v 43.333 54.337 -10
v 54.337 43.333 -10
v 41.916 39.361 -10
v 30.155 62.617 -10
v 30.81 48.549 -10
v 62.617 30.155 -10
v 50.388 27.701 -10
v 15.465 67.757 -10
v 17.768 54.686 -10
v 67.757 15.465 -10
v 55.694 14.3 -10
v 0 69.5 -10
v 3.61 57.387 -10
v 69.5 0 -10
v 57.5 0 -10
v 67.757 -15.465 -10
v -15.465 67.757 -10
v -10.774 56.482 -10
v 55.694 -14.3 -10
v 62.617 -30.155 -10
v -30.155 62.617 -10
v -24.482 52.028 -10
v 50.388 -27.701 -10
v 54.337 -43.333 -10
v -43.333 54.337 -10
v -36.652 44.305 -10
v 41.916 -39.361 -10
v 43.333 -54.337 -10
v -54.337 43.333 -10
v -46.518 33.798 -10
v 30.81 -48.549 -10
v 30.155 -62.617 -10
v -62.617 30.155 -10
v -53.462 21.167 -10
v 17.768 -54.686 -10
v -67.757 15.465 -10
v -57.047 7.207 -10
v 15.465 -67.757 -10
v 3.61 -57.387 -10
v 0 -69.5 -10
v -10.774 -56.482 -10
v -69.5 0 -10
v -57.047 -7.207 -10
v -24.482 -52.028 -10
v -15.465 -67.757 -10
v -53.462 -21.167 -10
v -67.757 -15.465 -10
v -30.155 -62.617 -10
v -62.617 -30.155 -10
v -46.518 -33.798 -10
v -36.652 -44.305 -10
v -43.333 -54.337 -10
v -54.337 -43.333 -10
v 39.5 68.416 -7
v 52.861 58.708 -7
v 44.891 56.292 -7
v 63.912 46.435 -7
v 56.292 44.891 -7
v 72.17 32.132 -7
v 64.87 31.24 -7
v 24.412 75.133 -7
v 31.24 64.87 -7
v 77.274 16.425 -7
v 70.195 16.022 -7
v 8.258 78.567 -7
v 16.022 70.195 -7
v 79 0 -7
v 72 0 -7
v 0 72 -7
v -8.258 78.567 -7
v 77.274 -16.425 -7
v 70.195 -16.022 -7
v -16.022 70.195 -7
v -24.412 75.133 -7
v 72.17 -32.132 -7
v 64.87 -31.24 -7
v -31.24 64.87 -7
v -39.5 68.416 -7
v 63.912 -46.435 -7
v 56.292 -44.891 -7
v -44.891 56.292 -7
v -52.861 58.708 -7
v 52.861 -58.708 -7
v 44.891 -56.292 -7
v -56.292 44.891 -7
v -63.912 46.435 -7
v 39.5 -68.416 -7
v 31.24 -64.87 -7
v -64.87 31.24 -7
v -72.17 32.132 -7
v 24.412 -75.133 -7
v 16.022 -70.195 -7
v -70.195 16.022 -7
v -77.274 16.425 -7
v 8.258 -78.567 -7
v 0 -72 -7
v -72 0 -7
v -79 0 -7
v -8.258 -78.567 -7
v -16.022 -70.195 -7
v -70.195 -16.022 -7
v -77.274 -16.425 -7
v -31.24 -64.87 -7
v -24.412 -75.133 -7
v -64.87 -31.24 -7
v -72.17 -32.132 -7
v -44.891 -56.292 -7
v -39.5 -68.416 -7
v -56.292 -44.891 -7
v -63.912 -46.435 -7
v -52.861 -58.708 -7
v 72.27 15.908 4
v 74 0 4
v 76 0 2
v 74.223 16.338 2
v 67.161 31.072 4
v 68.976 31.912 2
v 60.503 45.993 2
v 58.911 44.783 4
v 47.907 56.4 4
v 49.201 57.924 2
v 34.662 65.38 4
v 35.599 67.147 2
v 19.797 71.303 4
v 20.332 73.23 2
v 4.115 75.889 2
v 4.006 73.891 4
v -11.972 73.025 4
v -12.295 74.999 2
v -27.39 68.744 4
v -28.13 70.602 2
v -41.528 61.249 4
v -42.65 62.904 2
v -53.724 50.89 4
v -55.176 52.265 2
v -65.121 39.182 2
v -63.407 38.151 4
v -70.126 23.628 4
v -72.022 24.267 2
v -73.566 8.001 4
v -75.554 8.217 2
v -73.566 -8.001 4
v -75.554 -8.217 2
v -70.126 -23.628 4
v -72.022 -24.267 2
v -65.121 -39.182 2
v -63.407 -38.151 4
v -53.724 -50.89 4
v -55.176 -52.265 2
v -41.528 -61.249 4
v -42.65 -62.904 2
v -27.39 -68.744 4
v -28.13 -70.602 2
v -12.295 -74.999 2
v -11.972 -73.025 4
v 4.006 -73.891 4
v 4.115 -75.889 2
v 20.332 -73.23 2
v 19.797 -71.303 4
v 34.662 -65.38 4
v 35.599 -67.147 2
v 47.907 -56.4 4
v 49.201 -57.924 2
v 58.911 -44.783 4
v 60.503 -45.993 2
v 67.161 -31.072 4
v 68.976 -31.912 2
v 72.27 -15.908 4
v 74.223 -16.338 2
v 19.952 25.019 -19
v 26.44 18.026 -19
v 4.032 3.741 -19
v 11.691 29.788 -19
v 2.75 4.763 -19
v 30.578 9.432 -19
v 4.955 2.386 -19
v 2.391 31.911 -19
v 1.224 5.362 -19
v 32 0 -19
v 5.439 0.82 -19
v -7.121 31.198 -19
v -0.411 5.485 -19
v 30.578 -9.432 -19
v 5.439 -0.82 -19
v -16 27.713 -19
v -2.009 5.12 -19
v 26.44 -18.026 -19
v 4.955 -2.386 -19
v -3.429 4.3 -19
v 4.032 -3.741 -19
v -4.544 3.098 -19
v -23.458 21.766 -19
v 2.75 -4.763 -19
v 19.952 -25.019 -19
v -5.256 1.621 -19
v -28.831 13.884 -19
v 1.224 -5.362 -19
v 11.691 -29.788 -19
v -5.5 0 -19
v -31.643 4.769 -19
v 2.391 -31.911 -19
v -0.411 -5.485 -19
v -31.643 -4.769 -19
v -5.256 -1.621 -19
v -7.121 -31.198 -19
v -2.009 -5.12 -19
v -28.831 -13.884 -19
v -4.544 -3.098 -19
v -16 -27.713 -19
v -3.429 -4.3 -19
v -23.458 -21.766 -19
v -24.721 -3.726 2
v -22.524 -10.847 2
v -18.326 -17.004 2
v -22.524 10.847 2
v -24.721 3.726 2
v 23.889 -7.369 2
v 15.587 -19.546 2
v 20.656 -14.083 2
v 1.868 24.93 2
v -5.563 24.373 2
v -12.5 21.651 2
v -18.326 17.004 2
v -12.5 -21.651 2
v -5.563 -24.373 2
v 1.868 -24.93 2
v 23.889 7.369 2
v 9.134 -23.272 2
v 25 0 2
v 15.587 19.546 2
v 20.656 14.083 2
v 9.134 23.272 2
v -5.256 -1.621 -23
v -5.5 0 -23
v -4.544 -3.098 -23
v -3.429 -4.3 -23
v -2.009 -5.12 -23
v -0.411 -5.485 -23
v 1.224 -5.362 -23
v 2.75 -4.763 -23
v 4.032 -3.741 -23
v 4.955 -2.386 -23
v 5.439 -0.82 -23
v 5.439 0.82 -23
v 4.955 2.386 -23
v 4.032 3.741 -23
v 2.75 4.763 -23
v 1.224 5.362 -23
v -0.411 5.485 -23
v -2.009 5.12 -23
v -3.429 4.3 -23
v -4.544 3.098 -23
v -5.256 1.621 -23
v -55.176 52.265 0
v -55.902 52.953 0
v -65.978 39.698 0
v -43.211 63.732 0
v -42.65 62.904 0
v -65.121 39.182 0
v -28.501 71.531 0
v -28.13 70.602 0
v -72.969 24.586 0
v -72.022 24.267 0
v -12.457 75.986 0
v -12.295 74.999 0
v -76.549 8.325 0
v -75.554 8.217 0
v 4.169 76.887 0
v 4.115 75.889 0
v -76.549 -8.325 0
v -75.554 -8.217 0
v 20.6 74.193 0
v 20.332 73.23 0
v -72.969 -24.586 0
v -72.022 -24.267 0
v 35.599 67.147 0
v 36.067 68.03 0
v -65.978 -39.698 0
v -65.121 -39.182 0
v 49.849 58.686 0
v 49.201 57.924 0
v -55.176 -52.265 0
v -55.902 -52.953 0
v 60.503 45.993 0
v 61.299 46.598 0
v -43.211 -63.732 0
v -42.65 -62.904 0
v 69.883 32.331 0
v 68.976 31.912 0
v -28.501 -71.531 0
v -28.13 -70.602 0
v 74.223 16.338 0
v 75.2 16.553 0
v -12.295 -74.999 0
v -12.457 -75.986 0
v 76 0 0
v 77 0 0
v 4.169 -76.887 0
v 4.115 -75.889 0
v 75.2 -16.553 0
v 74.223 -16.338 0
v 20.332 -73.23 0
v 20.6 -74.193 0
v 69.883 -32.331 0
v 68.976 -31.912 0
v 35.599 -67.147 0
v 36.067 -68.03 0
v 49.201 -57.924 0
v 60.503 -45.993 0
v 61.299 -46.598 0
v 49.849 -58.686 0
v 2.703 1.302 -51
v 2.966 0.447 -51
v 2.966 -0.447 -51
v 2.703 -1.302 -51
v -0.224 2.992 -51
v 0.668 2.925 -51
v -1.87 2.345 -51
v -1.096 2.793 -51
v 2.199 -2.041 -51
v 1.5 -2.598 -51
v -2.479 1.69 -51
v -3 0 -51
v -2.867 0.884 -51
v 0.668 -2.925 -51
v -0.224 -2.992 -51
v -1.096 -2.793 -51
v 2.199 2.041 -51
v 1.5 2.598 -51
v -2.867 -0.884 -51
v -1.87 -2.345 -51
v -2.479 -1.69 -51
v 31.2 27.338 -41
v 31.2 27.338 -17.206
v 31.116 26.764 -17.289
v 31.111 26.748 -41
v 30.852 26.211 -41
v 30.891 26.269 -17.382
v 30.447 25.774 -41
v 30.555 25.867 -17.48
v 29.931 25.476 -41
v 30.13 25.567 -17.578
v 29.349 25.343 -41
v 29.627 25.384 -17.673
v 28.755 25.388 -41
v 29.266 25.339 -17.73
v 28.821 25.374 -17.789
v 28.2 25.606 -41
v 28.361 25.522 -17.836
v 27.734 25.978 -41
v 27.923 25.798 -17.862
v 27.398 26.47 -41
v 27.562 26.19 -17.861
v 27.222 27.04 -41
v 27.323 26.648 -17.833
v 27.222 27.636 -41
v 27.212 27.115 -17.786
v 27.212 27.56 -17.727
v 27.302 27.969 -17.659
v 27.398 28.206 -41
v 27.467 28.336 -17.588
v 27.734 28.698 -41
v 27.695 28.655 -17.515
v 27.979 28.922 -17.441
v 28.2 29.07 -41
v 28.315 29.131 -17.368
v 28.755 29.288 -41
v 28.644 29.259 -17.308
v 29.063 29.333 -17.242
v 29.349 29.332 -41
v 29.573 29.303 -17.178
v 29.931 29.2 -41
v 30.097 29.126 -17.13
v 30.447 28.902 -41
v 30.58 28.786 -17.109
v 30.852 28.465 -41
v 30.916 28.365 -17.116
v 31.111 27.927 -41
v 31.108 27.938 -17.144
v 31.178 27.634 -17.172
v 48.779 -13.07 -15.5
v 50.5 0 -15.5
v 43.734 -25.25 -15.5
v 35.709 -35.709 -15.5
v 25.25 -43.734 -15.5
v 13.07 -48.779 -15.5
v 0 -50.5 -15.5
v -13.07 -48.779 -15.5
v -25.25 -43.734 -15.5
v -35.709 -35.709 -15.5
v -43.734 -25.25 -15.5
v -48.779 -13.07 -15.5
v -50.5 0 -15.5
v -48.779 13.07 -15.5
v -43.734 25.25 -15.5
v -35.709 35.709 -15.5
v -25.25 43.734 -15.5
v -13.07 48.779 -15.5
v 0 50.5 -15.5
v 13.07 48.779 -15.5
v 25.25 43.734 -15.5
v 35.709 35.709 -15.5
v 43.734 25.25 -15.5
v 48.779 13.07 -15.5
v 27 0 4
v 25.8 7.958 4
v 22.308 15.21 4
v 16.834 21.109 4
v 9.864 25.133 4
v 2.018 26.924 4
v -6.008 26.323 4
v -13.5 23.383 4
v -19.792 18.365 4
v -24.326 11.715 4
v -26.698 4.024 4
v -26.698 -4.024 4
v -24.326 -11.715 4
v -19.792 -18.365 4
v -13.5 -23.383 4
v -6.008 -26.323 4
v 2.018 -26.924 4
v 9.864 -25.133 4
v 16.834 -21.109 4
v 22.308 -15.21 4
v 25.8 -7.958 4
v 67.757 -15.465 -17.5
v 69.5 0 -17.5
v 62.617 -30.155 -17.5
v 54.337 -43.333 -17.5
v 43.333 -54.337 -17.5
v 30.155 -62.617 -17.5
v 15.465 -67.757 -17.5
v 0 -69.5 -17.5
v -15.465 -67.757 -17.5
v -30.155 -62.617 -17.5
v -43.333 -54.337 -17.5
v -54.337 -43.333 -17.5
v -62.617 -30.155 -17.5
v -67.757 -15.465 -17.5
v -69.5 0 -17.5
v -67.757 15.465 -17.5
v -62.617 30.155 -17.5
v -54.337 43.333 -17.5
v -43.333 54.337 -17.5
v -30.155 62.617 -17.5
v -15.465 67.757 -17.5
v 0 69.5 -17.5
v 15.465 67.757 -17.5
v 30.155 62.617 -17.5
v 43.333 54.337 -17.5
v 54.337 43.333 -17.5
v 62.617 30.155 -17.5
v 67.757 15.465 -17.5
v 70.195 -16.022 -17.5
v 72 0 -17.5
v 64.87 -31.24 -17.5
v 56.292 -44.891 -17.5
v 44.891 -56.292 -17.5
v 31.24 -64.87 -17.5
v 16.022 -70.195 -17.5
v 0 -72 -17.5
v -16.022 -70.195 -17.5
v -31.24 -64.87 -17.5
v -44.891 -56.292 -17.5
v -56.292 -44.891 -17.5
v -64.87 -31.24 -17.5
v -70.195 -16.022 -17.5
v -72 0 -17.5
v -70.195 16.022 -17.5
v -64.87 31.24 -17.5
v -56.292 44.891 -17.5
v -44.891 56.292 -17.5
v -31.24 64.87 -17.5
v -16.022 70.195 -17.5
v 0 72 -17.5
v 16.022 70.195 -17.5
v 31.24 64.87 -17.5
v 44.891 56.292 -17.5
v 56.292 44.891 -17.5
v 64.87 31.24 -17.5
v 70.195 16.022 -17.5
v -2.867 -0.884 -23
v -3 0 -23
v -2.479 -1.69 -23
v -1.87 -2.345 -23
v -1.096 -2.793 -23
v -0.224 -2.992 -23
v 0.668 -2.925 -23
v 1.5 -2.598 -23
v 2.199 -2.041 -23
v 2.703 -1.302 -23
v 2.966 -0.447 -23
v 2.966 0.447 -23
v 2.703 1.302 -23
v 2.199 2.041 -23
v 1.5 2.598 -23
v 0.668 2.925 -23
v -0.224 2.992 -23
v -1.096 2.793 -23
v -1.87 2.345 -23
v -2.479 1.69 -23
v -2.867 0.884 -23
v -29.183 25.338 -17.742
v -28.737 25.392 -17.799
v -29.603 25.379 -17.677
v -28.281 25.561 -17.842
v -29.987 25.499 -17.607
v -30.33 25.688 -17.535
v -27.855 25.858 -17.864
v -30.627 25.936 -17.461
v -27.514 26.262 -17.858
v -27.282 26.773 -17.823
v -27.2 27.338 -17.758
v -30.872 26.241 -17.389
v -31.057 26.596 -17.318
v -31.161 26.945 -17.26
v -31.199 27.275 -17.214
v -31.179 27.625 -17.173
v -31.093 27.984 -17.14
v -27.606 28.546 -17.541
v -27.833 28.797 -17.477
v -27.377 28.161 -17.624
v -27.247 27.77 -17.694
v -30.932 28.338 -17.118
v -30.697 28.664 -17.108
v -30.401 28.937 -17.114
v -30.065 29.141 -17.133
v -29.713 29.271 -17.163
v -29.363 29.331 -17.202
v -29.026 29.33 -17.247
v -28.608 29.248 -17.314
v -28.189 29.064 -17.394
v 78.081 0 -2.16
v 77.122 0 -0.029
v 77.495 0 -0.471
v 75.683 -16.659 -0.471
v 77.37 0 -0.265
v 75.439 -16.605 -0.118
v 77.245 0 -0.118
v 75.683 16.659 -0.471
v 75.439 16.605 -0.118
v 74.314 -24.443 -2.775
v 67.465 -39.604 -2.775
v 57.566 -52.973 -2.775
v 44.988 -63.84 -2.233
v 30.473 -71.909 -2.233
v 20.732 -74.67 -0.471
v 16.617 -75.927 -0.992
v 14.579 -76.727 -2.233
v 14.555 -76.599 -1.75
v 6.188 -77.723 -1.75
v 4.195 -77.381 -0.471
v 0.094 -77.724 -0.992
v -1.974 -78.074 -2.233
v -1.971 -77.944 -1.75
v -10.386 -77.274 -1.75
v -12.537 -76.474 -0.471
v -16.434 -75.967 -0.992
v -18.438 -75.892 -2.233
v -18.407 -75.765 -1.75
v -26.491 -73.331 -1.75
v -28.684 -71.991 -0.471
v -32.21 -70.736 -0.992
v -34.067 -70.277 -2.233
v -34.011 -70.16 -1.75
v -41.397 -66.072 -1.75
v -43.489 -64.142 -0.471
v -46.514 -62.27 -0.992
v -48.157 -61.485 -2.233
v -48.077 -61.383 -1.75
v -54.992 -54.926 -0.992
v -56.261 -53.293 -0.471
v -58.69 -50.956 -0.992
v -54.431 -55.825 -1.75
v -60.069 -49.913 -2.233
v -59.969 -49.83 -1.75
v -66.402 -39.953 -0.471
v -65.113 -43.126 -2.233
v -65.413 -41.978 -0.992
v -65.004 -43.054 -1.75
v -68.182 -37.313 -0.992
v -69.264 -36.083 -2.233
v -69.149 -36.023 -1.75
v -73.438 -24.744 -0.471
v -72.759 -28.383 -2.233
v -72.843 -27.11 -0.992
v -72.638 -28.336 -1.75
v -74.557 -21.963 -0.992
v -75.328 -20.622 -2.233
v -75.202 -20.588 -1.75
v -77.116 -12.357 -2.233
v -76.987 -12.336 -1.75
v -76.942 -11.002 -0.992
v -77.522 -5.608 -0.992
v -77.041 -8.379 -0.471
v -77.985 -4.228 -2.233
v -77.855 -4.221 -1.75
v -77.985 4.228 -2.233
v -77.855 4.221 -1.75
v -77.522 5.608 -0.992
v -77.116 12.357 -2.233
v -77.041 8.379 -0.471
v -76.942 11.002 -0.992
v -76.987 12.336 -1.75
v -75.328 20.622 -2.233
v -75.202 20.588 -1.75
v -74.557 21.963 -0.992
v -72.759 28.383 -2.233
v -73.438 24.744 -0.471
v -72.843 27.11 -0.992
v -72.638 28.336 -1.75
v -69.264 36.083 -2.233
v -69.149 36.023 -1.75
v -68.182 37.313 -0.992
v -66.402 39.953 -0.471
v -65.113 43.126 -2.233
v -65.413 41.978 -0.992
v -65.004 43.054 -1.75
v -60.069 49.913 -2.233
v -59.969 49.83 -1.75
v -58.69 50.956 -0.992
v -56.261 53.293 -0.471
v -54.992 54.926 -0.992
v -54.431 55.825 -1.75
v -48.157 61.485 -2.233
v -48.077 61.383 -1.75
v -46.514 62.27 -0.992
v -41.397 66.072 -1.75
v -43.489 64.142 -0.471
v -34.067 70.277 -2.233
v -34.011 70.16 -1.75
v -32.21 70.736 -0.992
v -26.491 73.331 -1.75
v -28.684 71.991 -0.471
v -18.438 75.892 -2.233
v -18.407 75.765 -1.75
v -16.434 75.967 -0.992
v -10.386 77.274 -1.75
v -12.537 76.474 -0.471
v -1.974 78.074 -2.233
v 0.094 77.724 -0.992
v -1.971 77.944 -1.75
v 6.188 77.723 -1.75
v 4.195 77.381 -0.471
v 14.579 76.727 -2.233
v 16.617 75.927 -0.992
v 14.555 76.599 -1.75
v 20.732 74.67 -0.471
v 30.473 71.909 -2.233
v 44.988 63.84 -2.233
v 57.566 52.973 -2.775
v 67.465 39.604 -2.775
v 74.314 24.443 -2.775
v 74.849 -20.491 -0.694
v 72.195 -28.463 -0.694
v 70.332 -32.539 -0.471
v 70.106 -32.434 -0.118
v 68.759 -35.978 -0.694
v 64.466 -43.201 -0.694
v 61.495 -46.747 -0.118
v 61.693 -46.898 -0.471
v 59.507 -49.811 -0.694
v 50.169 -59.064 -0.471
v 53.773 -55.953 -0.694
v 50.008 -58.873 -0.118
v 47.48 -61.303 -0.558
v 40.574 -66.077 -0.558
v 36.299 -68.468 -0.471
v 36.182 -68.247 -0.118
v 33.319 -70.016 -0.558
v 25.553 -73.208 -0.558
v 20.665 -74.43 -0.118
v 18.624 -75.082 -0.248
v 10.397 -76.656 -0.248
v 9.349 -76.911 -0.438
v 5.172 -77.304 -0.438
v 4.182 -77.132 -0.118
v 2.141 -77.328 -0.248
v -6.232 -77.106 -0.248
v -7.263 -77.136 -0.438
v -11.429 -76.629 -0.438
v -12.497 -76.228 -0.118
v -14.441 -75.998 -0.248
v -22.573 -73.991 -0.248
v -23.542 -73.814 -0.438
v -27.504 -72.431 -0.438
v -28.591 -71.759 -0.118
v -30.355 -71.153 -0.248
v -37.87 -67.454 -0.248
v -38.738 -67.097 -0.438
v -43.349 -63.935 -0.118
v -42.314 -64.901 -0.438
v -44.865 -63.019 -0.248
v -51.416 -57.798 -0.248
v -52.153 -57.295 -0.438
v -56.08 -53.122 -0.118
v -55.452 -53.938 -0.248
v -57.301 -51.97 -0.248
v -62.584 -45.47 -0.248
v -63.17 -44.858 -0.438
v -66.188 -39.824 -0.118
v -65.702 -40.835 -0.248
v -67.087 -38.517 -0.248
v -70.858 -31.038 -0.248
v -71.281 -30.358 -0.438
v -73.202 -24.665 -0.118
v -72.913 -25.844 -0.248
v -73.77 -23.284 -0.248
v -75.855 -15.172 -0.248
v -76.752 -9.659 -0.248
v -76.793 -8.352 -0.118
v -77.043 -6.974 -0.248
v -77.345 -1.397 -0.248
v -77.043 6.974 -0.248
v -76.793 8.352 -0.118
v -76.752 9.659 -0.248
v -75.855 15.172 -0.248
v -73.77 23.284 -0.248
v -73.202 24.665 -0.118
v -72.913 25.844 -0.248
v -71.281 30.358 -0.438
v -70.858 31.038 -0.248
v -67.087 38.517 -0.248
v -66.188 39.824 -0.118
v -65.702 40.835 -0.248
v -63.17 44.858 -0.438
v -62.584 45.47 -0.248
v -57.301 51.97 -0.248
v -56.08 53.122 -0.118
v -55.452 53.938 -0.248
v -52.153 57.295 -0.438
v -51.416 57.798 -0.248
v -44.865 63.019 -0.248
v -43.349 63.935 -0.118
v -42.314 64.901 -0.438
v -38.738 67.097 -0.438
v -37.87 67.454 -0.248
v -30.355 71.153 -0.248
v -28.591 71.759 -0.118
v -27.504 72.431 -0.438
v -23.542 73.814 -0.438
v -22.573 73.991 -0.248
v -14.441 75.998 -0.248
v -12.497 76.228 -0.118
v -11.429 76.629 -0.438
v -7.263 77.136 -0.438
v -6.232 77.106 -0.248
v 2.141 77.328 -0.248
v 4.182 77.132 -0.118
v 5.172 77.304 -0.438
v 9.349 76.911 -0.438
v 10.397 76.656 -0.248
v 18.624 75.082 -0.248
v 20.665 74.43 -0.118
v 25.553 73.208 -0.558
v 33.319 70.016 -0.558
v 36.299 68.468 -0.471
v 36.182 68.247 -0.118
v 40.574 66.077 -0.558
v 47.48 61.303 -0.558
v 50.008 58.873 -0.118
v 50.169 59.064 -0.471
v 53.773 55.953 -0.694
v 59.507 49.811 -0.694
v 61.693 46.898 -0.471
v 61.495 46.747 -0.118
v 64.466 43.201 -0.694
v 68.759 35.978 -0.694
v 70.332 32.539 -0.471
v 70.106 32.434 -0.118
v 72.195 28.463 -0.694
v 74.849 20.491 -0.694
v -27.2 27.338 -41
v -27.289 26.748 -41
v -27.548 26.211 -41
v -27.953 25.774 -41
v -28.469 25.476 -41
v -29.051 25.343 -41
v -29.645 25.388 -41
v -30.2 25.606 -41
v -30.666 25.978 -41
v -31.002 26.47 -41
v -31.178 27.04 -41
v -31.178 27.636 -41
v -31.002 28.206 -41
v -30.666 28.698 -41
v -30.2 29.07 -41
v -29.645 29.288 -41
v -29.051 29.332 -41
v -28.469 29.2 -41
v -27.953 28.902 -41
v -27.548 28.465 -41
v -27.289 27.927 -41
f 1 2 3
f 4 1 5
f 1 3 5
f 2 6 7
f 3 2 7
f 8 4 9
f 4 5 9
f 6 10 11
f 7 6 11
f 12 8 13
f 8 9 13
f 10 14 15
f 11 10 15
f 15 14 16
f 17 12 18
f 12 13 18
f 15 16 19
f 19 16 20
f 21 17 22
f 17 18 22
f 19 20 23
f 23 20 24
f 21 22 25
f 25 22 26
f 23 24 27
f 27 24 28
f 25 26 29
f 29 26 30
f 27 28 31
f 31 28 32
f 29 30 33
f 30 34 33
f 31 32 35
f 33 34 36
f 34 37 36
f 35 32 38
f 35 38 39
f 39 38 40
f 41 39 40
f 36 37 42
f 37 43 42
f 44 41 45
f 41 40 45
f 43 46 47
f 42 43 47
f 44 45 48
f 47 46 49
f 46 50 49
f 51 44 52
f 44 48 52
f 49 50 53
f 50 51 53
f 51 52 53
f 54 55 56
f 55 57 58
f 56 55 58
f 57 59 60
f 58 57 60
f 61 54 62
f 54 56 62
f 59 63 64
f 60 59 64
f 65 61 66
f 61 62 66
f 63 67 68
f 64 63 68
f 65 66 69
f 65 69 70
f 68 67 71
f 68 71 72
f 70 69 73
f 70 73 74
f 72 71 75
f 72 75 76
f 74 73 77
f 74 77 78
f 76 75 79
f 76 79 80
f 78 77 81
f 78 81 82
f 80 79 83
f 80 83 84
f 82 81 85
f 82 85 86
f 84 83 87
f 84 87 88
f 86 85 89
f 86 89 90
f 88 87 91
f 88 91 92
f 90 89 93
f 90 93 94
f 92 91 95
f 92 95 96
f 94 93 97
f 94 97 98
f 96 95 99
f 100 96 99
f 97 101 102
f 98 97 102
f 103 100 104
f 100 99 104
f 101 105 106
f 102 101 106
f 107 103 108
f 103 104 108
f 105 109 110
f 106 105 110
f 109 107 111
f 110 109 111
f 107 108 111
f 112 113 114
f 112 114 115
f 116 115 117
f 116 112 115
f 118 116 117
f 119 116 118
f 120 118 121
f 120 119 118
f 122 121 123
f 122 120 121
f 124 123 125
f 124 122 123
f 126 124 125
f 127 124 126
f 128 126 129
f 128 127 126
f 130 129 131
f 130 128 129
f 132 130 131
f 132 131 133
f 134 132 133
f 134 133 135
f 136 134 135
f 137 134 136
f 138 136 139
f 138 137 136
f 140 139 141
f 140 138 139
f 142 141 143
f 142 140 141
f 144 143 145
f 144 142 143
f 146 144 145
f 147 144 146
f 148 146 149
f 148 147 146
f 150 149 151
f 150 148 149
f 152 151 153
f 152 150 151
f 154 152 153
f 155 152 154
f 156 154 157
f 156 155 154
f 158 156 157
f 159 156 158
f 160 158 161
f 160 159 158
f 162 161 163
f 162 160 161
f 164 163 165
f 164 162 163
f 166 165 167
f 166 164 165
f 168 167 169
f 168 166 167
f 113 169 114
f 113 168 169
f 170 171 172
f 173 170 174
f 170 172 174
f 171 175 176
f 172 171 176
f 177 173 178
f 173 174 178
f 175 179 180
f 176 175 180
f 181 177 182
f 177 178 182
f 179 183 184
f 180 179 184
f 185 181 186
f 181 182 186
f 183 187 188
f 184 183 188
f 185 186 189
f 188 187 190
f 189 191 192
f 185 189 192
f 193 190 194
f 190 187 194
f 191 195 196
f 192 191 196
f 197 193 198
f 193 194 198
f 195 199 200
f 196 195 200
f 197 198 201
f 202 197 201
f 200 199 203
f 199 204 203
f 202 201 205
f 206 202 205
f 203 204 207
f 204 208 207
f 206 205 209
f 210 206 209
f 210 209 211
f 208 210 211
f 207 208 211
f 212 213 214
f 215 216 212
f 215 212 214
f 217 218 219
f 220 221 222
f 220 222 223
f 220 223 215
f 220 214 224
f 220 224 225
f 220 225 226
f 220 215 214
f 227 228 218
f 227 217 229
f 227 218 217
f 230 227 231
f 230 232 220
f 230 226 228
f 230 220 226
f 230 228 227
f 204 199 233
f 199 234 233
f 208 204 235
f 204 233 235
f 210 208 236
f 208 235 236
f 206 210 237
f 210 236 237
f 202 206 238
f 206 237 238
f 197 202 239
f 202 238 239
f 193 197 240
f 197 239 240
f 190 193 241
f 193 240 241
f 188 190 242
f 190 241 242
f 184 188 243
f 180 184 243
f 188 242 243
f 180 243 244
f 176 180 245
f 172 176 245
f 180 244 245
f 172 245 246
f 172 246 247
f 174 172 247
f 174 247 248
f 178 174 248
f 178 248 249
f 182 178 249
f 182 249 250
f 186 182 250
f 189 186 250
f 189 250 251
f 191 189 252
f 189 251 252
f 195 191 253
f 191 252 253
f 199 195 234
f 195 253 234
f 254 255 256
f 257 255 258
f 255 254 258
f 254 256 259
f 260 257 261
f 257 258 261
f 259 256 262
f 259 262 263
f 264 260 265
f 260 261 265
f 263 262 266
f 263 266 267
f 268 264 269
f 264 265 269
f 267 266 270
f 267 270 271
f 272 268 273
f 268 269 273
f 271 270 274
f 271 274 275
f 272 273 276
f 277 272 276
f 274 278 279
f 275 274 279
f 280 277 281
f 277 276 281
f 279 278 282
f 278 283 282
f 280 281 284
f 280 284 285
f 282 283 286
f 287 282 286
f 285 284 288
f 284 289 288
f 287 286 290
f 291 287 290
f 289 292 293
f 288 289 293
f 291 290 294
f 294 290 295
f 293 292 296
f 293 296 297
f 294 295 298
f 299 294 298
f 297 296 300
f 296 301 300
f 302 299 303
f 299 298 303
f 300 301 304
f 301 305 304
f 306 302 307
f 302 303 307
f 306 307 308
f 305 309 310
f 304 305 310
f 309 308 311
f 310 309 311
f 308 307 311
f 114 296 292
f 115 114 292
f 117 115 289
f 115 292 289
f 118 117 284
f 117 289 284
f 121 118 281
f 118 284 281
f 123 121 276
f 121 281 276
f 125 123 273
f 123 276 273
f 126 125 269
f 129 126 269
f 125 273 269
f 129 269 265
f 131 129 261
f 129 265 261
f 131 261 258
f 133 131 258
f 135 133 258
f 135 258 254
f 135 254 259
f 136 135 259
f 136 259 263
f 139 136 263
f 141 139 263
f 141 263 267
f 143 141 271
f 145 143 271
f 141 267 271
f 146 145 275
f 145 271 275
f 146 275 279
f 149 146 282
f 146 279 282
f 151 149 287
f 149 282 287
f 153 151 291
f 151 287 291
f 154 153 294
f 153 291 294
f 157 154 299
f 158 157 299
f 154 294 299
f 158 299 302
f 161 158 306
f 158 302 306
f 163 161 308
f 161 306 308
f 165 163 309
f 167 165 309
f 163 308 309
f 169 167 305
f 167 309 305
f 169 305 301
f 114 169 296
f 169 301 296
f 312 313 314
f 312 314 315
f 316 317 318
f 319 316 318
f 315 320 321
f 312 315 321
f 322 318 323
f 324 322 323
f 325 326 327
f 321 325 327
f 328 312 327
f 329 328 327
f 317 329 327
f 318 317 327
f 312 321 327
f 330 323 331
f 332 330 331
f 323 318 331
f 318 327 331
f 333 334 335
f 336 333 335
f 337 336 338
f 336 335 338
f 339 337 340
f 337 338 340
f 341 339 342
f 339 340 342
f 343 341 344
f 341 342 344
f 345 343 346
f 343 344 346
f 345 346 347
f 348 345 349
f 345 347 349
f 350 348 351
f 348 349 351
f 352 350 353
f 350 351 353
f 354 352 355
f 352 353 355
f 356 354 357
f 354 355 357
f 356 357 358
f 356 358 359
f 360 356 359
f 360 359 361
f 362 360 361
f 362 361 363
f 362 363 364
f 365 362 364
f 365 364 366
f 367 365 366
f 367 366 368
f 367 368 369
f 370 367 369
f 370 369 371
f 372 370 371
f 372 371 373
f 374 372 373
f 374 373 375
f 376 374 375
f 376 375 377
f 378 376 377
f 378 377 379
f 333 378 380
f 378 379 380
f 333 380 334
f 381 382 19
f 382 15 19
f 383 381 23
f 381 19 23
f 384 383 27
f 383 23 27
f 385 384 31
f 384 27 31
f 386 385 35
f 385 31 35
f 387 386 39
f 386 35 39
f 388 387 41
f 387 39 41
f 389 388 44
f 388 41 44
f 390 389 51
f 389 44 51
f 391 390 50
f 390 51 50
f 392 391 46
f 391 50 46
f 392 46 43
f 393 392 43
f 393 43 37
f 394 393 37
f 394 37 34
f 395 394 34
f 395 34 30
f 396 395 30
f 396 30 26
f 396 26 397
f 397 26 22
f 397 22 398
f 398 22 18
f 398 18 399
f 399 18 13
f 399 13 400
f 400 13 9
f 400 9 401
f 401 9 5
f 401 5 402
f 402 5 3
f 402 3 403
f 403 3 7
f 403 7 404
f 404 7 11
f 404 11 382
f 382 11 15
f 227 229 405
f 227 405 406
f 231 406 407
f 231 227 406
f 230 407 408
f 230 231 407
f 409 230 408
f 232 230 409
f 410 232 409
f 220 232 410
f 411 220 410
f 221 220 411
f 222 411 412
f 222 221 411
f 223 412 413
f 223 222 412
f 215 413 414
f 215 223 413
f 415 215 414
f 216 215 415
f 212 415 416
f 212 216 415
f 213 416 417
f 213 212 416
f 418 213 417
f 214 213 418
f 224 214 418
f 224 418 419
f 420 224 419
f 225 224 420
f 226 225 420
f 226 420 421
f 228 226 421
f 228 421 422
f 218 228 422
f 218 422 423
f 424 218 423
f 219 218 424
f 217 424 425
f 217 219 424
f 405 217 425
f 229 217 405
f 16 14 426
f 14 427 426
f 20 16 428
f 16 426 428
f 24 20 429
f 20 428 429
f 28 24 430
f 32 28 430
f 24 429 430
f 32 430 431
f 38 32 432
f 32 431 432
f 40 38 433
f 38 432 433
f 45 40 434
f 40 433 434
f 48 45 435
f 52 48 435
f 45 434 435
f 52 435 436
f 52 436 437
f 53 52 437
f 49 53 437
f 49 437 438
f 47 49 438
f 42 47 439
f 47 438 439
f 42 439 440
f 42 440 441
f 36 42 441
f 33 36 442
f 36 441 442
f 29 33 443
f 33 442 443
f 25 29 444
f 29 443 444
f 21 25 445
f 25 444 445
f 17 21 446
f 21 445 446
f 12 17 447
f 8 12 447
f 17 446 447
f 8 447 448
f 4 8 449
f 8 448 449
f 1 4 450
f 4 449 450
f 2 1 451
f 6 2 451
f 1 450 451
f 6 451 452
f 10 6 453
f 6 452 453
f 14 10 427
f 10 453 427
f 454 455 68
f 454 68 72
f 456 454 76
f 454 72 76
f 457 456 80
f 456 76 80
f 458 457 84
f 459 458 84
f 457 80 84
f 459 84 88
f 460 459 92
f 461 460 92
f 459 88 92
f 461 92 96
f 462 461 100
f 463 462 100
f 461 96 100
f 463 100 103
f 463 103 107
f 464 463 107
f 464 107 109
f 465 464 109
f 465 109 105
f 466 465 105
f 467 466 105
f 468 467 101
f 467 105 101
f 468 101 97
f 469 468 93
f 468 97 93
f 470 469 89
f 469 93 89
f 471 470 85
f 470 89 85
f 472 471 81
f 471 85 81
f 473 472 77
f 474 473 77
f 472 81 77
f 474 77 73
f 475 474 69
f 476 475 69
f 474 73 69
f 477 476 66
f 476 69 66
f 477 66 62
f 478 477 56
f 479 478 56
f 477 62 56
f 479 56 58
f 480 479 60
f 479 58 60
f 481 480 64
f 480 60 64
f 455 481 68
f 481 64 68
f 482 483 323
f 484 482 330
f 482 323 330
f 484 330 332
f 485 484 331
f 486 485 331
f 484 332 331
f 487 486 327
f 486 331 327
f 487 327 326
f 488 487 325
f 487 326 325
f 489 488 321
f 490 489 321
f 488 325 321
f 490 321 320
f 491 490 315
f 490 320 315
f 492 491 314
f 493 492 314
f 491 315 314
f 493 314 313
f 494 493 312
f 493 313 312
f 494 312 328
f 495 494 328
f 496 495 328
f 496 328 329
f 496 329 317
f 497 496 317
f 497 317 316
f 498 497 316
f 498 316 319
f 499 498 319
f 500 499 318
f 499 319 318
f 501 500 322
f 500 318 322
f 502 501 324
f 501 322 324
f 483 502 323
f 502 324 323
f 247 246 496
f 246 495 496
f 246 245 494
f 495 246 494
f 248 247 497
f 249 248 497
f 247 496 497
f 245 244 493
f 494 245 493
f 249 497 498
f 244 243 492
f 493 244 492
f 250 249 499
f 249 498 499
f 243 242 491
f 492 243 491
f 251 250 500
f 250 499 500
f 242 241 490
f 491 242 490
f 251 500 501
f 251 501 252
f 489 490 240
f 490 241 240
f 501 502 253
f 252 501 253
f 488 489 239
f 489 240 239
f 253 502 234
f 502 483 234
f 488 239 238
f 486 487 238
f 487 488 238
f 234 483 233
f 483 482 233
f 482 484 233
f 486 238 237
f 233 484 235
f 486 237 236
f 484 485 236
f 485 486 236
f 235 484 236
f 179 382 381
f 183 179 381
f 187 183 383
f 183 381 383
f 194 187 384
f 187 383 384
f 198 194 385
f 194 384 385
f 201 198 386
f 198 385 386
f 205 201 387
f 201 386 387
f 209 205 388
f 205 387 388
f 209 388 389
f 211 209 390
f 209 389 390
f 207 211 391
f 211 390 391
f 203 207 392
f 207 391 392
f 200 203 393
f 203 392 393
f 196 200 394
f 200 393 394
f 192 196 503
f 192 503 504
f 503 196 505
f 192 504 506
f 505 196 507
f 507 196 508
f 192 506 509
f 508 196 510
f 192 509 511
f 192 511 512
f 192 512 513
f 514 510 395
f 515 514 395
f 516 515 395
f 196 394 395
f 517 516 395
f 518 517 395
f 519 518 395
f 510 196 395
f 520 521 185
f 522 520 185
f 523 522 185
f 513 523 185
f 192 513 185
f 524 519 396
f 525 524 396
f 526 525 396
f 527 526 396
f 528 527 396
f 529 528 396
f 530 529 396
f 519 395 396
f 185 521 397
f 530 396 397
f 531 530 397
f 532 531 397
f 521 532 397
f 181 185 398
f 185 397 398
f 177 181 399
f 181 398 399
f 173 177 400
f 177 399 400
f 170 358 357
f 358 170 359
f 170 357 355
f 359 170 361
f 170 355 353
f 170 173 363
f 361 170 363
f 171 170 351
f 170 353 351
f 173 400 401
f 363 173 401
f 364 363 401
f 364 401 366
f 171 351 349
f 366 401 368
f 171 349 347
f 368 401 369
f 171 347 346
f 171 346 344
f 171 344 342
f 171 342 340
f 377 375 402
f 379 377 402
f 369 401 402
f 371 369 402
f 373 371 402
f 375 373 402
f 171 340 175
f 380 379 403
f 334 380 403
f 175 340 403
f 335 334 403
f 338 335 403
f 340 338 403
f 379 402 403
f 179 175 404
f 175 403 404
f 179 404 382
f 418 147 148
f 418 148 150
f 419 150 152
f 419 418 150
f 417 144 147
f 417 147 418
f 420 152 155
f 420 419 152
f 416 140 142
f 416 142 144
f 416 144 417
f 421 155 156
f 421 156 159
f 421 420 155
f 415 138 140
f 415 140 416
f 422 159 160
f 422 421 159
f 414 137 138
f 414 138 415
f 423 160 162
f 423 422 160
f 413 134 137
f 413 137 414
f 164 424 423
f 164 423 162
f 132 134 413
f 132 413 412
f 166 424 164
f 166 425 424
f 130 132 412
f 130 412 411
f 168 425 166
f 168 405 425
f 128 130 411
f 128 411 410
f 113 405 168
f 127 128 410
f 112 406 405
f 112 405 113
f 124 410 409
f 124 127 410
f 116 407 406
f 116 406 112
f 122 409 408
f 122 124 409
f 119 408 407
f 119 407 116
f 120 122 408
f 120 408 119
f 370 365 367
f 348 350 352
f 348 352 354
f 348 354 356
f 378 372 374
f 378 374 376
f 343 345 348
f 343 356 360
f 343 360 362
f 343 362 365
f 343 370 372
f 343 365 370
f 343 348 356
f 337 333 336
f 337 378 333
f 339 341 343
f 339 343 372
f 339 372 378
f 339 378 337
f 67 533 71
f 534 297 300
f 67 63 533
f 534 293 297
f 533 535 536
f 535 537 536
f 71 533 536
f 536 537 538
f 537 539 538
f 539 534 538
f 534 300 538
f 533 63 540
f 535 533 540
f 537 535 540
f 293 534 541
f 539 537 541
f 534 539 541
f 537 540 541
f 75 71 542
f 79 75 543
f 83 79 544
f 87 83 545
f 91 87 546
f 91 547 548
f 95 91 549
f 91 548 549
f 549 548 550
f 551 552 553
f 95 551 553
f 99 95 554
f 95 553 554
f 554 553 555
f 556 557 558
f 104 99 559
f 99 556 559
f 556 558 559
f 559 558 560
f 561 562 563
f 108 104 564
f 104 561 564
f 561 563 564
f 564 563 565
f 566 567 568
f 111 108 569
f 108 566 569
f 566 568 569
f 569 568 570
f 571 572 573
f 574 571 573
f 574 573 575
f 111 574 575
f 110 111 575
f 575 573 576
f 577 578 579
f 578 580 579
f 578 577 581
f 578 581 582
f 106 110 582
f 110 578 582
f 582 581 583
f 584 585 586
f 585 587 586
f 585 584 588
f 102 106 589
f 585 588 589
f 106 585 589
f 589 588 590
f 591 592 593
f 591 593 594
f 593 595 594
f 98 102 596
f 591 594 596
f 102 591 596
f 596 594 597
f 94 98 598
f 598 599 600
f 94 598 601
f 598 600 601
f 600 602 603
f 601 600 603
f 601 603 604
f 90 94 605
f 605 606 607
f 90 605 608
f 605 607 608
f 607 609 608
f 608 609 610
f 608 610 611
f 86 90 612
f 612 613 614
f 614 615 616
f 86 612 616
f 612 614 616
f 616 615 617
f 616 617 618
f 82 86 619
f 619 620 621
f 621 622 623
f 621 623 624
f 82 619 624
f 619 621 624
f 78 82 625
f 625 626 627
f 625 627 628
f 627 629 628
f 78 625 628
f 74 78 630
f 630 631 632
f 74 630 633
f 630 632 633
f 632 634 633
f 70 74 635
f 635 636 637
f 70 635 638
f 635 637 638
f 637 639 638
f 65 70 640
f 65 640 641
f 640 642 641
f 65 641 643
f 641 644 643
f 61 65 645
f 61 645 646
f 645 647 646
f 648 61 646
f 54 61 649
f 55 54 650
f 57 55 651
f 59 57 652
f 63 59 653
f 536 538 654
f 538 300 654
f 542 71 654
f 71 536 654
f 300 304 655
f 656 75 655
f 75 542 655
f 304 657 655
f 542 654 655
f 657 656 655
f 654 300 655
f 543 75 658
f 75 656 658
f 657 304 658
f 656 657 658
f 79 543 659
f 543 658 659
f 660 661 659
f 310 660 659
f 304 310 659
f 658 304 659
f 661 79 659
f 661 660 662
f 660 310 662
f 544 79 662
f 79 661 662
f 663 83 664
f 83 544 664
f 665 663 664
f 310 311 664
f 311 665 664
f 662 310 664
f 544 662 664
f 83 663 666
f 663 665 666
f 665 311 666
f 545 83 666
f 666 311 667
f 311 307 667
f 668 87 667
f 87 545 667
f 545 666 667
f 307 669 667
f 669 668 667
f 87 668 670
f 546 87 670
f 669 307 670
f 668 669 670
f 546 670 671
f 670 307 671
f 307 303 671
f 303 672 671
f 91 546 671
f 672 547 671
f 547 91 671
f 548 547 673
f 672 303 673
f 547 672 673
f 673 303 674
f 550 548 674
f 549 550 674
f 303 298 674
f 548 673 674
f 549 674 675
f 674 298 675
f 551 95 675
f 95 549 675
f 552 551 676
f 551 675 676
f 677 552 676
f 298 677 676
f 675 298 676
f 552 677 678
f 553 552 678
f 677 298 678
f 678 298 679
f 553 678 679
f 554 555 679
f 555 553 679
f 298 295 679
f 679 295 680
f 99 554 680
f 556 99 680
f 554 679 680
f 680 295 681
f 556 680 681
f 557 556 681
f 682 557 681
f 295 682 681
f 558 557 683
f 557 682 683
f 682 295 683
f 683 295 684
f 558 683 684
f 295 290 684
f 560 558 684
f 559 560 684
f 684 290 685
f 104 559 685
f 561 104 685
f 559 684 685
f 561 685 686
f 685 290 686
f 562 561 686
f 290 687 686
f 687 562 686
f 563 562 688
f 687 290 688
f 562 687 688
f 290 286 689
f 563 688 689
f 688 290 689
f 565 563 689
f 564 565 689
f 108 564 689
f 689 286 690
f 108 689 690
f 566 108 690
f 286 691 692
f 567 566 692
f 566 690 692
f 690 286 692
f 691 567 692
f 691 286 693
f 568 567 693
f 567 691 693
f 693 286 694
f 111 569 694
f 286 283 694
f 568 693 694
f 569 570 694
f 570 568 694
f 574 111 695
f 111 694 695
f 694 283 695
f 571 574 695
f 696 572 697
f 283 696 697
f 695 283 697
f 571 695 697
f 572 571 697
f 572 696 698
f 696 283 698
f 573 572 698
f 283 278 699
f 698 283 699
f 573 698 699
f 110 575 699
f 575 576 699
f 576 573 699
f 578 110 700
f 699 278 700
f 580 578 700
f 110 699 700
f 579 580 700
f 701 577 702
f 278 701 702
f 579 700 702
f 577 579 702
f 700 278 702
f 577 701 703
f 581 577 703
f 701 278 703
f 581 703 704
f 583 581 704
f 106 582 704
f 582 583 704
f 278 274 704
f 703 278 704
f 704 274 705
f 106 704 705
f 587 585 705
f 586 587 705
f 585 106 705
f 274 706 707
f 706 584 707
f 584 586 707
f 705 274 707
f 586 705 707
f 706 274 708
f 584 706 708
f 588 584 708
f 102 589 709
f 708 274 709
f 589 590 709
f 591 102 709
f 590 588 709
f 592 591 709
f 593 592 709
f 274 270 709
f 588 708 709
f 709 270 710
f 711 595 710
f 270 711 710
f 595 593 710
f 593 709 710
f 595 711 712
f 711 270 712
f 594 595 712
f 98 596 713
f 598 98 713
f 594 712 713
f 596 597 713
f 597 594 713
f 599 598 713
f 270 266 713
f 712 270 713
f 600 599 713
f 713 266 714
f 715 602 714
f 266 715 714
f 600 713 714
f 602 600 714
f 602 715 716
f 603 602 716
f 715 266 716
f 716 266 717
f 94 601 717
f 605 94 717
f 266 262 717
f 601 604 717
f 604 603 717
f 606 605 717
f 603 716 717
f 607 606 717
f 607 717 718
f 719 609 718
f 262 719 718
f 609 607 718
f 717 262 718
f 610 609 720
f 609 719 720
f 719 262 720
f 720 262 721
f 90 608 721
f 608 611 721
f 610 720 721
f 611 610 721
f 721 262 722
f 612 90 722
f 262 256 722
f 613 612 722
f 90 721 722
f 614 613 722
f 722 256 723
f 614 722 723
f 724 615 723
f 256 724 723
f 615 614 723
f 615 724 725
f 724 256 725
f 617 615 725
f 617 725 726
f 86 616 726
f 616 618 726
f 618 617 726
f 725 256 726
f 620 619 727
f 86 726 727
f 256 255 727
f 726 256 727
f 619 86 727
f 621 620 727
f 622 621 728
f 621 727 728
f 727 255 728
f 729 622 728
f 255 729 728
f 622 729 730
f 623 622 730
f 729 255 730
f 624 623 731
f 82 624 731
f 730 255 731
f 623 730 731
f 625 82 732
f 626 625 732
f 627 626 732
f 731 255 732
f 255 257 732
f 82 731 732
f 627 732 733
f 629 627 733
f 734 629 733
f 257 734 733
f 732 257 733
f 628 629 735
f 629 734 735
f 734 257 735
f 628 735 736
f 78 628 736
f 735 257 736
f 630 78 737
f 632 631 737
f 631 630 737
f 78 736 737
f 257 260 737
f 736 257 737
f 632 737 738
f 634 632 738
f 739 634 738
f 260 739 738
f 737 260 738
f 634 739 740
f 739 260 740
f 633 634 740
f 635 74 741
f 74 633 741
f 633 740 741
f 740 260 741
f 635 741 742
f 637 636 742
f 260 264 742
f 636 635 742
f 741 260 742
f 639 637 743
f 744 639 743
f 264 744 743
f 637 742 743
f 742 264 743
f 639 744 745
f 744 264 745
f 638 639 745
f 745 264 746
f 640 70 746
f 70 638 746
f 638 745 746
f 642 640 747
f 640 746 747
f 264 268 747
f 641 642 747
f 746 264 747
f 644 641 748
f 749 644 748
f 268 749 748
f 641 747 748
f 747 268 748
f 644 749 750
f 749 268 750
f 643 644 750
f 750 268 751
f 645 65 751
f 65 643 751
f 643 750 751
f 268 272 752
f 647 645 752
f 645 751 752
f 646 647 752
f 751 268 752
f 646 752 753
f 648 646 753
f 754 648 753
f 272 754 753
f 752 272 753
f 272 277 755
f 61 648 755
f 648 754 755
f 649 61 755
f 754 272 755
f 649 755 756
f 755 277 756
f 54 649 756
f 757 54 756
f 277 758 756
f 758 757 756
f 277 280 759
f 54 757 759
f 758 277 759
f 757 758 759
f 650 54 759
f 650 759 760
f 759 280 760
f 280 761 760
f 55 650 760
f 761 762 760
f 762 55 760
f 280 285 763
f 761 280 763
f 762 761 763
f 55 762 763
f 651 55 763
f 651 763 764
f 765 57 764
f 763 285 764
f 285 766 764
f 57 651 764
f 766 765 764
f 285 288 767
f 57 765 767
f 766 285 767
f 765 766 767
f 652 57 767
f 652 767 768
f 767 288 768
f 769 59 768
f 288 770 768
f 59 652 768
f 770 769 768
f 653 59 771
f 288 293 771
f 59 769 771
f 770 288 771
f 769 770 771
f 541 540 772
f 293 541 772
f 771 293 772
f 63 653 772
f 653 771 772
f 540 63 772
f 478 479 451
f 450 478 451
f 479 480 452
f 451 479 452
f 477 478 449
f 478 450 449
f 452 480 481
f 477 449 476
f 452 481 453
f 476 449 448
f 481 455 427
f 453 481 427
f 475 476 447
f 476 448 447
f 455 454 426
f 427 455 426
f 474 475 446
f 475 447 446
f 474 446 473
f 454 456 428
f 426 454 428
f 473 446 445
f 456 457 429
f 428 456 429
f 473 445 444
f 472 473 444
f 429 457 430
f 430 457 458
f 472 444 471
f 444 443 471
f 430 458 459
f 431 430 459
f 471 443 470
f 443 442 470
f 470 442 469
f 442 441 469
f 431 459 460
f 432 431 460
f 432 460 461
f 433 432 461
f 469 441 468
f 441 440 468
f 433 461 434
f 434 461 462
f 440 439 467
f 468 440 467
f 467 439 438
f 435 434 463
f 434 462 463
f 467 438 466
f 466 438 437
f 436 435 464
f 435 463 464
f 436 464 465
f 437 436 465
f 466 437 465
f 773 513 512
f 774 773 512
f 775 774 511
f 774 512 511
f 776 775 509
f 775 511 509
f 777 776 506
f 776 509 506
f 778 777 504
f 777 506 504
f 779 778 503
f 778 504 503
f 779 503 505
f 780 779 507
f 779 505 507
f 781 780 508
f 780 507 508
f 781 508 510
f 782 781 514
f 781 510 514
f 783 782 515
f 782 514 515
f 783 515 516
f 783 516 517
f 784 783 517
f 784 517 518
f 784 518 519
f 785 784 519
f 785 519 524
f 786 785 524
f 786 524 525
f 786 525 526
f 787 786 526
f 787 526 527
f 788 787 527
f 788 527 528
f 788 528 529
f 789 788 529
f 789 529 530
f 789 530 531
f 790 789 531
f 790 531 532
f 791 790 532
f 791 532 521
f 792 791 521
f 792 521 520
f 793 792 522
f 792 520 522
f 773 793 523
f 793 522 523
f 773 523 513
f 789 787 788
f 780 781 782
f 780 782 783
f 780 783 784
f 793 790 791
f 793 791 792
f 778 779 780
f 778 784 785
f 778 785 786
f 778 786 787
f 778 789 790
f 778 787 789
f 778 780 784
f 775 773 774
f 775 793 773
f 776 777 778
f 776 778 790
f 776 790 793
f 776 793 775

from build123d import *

# Parameters (mm, degrees)
SKETCH1_R           = 76
BOSS_EXTRUDE1_DEPTH = 4
CHAMFER1_SIZE       = 2
SKETCH2_R           = 25
CUT_EXTRUDE1_DEPTH  = 2
CHAMFER2_SIZE       = 2
SKETCH6_R           = 2
BOSS_EXTRUDE2_DEPTH = 34


with BuildPart() as part:
    # Sketch1 → Boss-Extrude1 (new body)
    with BuildSketch(Plane.XY):
        Circle(SKETCH1_R)
    extrude(amount=BOSS_EXTRUDE1_DEPTH)

    # Chamfer1
    chamfer1_edges = [part.edges().sort_by_distance(p)[0] for p in [
        (-76, 0, 4),
    ]]
    chamfer(chamfer1_edges, length=CHAMFER1_SIZE)

    # Sketch2 → Cut-Extrude1 (cut)
    with BuildSketch(Plane.XY.offset(4)):
        Circle(SKETCH2_R)
    extrude(amount=-CUT_EXTRUDE1_DEPTH, mode=Mode.SUBTRACT)

    # Chamfer2
    chamfer2_edges = [part.edges().sort_by_distance(p)[0] for p in [
        (-25, 0, 4),
    ]]
    chamfer(chamfer2_edges, length=CHAMFER2_SIZE - 0.0001)  # a hair under: the kernel refuses the full size

    # Sketch3 → Revolve1 (revolve)
    with BuildSketch(Plane(origin=(0, 0, 0), x_dir=(1, 0, 0), z_dir=(0, 1, 0)), mode=Mode.PRIVATE) as revolve1_sk:
        with BuildLine():
            Line((0, 0), (0, 19))
            Line((0, 19), (-32, 19))
            Line((-32, 19), (-50.5, 15.5))
            Line((-50.5, 15.5), (-57.5, 10))
            Line((-57.5, 10), (-69.5, 10))
            Line((-69.5, 10), (-69.5, 17.5))
            Line((-69.5, 17.5), (-72, 17.5))
            Line((-72, 17.5), (-72, 7))
            Line((-72, 7), (-79, 7))
            add(Edge.make_bspline(
                [(-79, 7), (-77.938493586, 0), (-77, 0)],
                knots=[0, 0, 0, 1, 1, 1], degree=2))
            Line((-77, 0), (0, 0))
        make_face()
    revolve(revolve1_sk.sketch.rotate(Axis((0, 0, 0), (0, 0, -1)), 180), axis=Axis((0, 0, 0), (0, 0, -1)))

    # Sketch5 → Revolve2 (revolve)
    with BuildSketch(Plane(origin=(0, 0, 0), x_dir=(1, 0, 0), z_dir=(0, 1, 0))):
        Polygon((0, 19), (-5.5, 19), (-5.5, 23), (-3, 23), (-3, 51), (0, 51), align=None)
    revolve(axis=Axis((0, 0, -51), (0, 0, 1)))

    # Sketch6 → Boss-Extrude2 (add)
    with BuildSketch(Plane(origin=(0, 0, -7), x_dir=(-1, 0, 0), z_dir=(0, 0, -1))):
        with Locations(Location((-29.2, 27.3378858, 0), (0, 0, 180))):
            Circle(SKETCH6_R)
        with Locations(Location((29.2, 27.3378858, 0), (0, 0, 180))):
            Circle(SKETCH6_R)
    extrude(amount=BOSS_EXTRUDE2_DEPTH)


solid = part.part
